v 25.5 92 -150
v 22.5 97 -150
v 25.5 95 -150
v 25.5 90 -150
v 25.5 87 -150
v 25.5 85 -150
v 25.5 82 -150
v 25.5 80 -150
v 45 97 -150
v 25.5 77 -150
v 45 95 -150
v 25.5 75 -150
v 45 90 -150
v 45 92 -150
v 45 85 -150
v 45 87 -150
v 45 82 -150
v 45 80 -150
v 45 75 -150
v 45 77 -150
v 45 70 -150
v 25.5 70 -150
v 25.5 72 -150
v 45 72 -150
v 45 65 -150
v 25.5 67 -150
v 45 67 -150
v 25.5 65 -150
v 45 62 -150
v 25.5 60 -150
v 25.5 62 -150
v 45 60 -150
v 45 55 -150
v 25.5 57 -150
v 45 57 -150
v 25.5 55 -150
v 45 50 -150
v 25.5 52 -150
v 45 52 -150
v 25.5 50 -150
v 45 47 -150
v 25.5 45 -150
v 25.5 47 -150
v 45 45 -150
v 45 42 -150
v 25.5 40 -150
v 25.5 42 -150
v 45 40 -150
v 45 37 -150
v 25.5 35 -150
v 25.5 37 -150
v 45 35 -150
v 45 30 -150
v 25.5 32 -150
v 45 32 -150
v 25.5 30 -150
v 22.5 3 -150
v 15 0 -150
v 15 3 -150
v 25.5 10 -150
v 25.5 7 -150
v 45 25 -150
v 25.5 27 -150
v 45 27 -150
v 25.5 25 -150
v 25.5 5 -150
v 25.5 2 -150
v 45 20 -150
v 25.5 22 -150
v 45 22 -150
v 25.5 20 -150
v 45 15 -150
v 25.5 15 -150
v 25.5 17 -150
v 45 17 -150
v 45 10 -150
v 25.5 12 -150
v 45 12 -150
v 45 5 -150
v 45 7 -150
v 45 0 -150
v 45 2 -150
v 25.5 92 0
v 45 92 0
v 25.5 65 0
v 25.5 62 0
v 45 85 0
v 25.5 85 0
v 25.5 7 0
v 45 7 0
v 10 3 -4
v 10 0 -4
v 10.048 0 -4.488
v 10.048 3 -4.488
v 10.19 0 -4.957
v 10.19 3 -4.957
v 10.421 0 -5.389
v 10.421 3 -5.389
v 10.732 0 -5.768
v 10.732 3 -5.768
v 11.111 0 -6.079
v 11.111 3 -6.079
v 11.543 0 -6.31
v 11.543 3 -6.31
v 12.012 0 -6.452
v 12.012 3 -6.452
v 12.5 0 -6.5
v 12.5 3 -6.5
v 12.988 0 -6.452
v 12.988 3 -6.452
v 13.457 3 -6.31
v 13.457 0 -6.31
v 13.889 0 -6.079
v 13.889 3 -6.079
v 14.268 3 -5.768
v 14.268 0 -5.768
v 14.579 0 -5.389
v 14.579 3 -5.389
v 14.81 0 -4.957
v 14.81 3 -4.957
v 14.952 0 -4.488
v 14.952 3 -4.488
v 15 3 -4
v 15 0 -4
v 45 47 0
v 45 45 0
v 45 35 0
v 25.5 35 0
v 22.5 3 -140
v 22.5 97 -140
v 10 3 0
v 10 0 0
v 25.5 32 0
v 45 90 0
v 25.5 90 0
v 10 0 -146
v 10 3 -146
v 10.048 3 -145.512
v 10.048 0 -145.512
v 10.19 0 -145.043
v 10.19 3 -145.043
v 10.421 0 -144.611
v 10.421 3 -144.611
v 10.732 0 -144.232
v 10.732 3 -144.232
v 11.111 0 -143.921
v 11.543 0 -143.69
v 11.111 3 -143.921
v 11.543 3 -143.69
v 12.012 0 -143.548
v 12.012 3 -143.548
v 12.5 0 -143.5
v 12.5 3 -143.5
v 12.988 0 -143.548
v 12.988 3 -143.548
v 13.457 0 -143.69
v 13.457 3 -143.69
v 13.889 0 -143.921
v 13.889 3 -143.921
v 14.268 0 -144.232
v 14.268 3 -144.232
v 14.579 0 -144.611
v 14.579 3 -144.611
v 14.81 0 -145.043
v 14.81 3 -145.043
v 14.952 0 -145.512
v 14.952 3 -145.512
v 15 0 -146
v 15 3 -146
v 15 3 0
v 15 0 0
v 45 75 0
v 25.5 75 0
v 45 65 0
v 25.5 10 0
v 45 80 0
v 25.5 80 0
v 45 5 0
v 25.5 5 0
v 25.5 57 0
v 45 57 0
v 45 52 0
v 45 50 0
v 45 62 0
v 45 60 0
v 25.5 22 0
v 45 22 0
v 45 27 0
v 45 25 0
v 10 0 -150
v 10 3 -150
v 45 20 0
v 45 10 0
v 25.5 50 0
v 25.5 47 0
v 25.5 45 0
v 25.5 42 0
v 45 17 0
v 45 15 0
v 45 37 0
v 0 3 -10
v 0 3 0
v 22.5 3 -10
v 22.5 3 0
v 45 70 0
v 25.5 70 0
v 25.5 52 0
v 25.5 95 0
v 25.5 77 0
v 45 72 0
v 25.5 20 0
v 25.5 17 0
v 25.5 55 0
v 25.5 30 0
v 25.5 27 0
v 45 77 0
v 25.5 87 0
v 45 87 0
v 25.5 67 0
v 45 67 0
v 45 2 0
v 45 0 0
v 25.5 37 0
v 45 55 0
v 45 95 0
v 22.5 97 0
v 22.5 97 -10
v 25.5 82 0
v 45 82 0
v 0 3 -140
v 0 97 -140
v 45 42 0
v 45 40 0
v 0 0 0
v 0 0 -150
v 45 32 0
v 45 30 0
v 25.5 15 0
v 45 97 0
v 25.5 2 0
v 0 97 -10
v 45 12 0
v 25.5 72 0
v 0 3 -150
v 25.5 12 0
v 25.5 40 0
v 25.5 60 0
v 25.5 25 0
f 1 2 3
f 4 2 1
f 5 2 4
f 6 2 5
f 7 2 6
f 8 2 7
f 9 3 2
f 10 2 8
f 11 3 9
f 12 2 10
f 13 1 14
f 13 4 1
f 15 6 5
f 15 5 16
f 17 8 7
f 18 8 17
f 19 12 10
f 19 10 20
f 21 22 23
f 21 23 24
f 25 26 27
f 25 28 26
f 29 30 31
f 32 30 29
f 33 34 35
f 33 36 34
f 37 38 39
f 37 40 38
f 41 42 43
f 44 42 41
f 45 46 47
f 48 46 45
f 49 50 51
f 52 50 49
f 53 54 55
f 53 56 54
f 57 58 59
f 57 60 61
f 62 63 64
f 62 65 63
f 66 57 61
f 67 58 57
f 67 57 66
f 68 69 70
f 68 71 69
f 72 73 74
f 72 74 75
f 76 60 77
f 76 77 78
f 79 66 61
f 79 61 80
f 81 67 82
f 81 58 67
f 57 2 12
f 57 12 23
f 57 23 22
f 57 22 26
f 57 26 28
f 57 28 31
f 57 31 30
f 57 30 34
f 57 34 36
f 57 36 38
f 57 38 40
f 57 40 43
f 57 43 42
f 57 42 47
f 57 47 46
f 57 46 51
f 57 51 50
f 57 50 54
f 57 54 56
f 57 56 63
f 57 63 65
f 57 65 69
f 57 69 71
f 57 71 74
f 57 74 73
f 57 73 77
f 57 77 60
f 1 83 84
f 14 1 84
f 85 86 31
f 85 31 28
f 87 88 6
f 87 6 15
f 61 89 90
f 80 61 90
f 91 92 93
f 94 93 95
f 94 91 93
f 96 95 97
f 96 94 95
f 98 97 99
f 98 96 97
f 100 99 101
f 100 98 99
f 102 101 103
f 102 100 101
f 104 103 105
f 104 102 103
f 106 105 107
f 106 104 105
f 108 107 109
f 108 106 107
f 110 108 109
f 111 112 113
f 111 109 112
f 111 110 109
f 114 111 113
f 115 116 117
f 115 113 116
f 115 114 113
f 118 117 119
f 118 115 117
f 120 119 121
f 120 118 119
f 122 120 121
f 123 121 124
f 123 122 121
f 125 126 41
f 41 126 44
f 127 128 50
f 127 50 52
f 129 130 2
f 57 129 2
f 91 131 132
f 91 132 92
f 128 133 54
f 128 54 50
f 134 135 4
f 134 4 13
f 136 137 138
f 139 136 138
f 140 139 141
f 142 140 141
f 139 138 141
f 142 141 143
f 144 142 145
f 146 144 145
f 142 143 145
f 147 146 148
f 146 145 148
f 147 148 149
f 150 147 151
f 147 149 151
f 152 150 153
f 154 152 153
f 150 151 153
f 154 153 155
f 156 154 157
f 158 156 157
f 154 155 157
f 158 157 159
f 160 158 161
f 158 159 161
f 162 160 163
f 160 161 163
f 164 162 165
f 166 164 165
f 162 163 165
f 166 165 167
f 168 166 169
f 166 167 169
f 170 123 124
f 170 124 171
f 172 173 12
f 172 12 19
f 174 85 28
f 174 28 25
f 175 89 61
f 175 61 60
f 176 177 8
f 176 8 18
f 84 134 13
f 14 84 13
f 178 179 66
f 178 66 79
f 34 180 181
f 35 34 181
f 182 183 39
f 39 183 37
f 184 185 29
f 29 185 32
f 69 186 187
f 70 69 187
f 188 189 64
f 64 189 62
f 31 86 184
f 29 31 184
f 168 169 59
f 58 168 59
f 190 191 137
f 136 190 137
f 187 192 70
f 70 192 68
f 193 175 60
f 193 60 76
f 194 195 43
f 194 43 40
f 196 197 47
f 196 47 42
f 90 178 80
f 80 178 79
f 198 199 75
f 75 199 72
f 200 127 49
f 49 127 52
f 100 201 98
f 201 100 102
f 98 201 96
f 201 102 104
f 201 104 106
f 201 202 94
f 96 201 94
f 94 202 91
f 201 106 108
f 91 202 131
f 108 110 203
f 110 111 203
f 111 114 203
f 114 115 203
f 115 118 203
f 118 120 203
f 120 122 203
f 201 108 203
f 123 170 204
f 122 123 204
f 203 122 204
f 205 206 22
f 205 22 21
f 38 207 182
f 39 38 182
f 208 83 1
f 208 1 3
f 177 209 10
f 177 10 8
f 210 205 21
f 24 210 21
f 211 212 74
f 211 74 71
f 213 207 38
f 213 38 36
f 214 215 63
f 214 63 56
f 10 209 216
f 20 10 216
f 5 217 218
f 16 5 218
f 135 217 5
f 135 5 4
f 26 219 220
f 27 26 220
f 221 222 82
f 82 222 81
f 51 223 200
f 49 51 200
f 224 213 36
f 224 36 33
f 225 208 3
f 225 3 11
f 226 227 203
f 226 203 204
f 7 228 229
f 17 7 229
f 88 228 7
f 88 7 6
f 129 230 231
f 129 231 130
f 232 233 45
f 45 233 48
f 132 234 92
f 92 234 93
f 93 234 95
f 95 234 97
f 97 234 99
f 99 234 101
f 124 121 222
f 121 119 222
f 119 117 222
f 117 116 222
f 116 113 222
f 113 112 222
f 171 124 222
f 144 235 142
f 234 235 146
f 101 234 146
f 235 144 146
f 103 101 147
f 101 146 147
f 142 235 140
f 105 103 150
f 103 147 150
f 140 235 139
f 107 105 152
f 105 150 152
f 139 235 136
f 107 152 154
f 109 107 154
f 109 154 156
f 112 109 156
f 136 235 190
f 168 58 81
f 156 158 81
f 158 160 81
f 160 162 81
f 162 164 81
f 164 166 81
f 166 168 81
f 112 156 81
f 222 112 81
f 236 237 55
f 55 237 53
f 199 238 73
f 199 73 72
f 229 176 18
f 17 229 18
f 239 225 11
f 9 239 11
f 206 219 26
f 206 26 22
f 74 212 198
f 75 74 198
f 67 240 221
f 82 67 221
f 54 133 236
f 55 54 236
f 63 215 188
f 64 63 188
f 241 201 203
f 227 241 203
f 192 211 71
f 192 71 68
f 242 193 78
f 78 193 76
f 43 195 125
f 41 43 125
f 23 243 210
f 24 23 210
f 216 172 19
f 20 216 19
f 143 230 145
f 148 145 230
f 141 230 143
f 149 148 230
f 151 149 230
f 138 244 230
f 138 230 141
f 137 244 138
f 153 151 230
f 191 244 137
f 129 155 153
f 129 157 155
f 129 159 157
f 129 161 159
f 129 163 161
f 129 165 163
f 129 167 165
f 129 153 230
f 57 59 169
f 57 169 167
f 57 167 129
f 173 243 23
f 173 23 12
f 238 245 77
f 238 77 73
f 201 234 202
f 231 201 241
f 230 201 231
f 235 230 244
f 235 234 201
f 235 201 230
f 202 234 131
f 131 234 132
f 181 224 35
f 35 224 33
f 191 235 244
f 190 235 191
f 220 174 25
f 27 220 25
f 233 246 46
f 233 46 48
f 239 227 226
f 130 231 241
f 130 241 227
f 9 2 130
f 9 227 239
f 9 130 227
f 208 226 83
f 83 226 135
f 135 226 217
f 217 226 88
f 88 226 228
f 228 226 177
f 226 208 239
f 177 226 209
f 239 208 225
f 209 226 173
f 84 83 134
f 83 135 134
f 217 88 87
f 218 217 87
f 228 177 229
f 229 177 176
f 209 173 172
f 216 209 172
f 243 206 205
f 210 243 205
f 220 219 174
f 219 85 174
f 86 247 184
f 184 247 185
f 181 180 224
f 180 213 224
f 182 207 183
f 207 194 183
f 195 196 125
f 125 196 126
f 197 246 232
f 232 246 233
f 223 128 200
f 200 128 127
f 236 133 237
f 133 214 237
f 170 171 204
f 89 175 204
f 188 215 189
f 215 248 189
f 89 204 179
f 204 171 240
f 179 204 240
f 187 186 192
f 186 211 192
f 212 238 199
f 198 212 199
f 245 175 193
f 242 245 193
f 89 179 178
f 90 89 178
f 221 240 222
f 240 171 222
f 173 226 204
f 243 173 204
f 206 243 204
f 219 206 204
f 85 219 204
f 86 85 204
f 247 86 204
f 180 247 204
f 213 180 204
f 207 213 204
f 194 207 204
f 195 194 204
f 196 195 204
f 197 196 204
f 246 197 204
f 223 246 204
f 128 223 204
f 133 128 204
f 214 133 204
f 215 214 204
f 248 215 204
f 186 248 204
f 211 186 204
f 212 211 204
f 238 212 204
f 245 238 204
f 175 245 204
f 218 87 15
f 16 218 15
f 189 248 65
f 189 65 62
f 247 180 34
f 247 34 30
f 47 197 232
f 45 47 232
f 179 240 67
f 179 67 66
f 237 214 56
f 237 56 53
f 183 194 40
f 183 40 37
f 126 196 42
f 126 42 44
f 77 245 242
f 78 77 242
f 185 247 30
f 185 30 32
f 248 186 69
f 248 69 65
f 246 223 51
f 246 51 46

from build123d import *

# Parameters (mm, degrees)
SKETCH1_W           = 45
SKETCH1_H           = 150
BOSS_EXTRUDE1_DEPTH = 97
SKETCH2_W           = 22.5
SKETCH2_H           = 10
CUT_EXTRUDE1_DEPTH  = 94
CUT_EXTRUDE2_DEPTH  = 183.649938407
SKETCH4_W           = 19.5
SKETCH4_H           = 3
CUT_EXTRUDE3_DEPTH  = 185.211834582
LPATTERN1_COUNT     = 19
LPATTERN1_PITCH     = 5


with BuildPart() as part:
    # Sketch1 → Boss-Extrude1 (new body)
    with BuildSketch(Plane(origin=(0, 0, 0), x_dir=(1, 0, 0), z_dir=(0, 1, 0))):
        with Locations((22.5, 75)):
            Rectangle(SKETCH1_W, SKETCH1_H)
    extrude(amount=BOSS_EXTRUDE1_DEPTH)

    # Sketch2 → Cut-Extrude1 (cut)
    with BuildSketch(Plane(origin=(0, 97, 0), x_dir=(1, 0, 0), z_dir=(0, 1, 0))):
        with Locations((11.25, 145)):
            Rectangle(SKETCH2_W, SKETCH2_H)
    cut_extrude1 = extrude(amount=-CUT_EXTRUDE1_DEPTH, mode=Mode.SUBTRACT)

    # Sketch3 → Cut-Extrude2 (cut, through all)
    with BuildSketch(Plane(origin=(0, 3, 0), x_dir=(1, 0, 0), z_dir=(0, 1, 0))):
        with BuildLine():
            Line((10, 150), (10, 146))
            ThreePointArc((10, 146), (12.5, 143.5), (15, 146))
            Line((15, 146), (15, 150))
            Line((15, 150), (10, 150))
        make_face()
    cut_extrude2 = extrude(amount=-CUT_EXTRUDE2_DEPTH, mode=Mode.SUBTRACT)

    # Mirror1: Cut-Extrude1, Cut-Extrude2 across plane
    add(cut_extrude1.mirror(Plane.XY.offset(-75)), mode=Mode.SUBTRACT)
    add(cut_extrude2.mirror(Plane.XY.offset(-75)), mode=Mode.SUBTRACT)

    # Sketch4 → Cut-Extrude3 (cut, through all)
    with BuildSketch(Plane.XY):
        with Locations((35.25, 93.5)):
            Rectangle(SKETCH4_W, SKETCH4_H)
    cut_extrude3 = extrude(amount=-CUT_EXTRUDE3_DEPTH, mode=Mode.SUBTRACT)

    # LPattern1: Cut-Extrude3 ×19
    with Locations(*[(0, -i * LPATTERN1_PITCH, 0) for i in range(1, LPATTERN1_COUNT)]):
        add(cut_extrude3, mode=Mode.SUBTRACT)


solid = part.part
